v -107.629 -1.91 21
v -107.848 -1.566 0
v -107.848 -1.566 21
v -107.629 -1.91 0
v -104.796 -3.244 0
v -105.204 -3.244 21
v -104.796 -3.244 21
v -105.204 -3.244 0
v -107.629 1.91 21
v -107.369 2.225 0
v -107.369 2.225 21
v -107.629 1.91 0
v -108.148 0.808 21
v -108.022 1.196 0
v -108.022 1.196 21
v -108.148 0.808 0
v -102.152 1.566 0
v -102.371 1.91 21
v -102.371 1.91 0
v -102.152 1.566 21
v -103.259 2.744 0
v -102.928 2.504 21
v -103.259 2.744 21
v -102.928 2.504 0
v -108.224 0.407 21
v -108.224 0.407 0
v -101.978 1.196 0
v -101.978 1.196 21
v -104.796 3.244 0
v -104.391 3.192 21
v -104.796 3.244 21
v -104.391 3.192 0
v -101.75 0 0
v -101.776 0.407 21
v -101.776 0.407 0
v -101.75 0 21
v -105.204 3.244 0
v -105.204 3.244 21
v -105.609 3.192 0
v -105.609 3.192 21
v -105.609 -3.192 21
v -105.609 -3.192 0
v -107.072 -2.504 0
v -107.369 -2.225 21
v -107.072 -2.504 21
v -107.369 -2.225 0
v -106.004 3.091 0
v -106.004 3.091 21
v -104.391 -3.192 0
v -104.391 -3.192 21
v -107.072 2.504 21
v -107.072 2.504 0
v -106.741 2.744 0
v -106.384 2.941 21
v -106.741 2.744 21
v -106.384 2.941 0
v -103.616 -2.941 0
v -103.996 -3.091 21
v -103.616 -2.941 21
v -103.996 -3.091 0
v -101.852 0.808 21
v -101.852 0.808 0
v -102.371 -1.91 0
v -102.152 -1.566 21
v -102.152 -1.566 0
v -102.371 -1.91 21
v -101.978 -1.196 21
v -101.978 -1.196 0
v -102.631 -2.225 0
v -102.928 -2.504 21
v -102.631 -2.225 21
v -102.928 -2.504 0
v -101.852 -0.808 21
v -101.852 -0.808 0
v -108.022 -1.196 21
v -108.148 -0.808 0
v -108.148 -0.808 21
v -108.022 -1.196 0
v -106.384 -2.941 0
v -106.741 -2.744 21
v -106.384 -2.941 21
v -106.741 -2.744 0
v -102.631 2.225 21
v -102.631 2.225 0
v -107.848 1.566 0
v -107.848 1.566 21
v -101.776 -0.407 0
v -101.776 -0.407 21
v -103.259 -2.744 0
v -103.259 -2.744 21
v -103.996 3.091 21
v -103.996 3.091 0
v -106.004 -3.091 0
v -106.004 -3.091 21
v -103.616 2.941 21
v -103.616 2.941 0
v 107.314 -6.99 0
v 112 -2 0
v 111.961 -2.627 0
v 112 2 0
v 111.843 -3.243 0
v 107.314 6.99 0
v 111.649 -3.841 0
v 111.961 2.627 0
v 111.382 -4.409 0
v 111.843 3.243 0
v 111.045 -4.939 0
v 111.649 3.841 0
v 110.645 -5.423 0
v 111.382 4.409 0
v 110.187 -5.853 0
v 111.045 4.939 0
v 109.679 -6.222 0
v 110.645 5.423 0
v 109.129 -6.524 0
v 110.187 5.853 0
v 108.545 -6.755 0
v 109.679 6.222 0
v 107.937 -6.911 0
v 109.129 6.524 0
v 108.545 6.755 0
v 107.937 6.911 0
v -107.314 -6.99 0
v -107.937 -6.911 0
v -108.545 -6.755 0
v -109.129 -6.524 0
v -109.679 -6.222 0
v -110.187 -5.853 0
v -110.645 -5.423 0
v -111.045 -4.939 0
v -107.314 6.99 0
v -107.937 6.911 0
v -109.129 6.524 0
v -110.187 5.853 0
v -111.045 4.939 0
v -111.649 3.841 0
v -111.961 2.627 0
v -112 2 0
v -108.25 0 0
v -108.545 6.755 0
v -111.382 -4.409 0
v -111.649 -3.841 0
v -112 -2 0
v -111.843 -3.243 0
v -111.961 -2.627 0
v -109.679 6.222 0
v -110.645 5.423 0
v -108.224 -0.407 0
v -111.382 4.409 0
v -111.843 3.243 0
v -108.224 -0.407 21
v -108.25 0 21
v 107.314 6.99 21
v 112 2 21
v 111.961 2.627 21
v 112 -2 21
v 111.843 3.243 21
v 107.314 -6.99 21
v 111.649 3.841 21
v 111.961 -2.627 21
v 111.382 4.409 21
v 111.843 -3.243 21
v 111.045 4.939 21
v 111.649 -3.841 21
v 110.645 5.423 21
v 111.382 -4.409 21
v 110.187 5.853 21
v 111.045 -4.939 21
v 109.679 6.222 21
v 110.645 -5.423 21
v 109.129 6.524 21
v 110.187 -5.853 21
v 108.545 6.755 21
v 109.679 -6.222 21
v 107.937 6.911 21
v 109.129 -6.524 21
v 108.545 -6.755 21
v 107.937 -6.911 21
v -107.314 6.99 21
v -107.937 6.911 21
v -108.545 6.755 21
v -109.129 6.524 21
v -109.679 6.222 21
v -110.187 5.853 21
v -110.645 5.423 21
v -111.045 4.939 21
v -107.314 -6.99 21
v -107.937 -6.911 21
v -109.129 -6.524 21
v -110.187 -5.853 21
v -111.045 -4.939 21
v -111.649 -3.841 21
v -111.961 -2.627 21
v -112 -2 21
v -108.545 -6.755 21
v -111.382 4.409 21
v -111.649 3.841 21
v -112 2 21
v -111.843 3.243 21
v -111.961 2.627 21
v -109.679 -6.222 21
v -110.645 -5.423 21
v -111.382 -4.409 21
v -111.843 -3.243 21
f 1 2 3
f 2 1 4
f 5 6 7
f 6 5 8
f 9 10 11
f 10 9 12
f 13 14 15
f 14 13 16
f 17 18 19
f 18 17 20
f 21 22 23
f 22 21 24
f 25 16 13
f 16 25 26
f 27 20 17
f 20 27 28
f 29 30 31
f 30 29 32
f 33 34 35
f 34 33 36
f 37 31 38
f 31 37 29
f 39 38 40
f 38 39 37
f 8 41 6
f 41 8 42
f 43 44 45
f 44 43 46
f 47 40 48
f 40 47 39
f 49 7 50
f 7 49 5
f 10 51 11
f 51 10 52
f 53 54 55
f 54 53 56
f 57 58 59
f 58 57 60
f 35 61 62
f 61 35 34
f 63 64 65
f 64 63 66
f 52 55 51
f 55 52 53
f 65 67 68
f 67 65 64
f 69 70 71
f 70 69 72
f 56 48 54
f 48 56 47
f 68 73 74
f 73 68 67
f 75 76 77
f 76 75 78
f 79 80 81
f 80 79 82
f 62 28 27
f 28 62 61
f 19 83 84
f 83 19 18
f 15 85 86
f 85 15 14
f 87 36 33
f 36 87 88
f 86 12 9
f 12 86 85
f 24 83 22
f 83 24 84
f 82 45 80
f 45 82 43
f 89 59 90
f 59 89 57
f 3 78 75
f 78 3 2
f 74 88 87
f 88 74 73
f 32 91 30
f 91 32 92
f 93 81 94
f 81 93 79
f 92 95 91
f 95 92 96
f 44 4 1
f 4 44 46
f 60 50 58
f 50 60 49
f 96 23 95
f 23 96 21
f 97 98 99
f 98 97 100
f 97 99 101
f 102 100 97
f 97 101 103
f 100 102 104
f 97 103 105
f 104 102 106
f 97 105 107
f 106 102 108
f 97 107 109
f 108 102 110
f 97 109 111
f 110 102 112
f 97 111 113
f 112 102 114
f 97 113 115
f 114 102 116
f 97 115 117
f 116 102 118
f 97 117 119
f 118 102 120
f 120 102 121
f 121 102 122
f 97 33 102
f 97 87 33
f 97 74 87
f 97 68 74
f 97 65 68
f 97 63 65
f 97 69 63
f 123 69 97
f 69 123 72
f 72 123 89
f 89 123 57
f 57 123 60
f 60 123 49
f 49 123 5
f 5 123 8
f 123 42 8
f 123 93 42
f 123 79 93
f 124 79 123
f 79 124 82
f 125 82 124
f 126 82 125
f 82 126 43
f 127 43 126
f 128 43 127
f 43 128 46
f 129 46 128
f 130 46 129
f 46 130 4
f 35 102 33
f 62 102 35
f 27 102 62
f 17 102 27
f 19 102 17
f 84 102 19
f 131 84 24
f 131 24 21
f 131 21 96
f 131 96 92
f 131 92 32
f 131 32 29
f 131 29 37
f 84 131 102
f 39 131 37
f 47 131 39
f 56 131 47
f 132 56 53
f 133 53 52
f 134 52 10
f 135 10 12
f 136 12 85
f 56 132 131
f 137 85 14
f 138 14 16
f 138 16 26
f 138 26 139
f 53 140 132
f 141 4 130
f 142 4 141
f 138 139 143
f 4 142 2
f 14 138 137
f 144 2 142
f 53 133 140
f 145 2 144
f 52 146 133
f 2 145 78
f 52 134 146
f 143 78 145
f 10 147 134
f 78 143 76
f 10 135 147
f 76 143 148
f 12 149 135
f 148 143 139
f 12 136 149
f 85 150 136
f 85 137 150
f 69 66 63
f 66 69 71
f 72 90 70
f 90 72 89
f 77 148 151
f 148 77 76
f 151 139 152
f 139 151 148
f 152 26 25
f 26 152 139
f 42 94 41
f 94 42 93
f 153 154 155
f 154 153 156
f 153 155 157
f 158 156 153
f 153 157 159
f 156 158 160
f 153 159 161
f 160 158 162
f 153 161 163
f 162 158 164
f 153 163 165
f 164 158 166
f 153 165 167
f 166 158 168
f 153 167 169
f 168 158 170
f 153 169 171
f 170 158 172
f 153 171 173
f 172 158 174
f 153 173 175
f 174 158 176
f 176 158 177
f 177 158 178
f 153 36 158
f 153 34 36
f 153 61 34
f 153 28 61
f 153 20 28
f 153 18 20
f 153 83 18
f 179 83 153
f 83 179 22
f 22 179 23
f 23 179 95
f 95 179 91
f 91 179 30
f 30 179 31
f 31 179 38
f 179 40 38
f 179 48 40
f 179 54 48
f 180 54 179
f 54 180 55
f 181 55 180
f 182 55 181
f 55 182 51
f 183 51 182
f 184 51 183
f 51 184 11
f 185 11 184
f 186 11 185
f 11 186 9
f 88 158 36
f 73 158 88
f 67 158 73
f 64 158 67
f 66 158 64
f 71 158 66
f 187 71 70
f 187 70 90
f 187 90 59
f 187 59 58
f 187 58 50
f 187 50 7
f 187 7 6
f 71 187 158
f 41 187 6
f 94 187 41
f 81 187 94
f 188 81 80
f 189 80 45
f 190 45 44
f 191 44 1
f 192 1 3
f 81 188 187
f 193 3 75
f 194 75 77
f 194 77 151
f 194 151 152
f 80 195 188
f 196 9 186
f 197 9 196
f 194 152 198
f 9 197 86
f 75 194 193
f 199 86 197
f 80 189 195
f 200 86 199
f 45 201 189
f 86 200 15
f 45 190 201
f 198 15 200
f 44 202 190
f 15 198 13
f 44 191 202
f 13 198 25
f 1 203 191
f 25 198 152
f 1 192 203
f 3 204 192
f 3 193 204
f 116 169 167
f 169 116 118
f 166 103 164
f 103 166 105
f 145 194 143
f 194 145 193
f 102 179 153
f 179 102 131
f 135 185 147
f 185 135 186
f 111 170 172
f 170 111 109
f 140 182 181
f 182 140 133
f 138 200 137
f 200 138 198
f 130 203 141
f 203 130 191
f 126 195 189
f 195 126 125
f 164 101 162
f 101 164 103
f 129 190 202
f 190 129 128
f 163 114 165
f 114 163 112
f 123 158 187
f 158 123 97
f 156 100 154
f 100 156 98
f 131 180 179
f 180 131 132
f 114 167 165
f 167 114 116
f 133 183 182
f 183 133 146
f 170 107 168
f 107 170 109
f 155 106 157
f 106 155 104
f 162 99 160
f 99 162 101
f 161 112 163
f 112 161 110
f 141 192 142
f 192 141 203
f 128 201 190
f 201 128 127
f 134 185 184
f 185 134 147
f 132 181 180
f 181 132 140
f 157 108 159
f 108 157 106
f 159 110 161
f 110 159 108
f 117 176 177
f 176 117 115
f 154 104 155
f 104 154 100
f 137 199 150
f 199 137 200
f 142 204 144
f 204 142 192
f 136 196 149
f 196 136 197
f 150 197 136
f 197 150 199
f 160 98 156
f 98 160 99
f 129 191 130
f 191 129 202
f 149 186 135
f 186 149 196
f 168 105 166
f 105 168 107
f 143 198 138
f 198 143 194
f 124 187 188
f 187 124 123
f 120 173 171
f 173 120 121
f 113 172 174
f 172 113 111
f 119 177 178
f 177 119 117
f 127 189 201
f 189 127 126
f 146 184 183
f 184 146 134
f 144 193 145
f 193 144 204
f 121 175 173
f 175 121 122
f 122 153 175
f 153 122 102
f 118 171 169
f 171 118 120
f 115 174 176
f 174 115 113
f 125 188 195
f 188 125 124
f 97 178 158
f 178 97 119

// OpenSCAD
$fn = 50;


difference() {
	union() {
		hull() {
			translate(v = [-107.0000000000, 2.0000000000, 0]) {
				cylinder(h = 21, r = 5);
			}
			translate(v = [107.0000000000, 2.0000000000, 0]) {
				cylinder(h = 21, r = 5);
			}
			translate(v = [-107.0000000000, -2.0000000000, 0]) {
				cylinder(h = 21, r = 5);
			}
			translate(v = [107.0000000000, -2.0000000000, 0]) {
				cylinder(h = 21, r = 5);
			}
		}
	}
	union() {
		translate(v = [-105.0000000000, 0.0000000000, 0]) {
			cylinder(h = 21, r = 3.2500000000);
		}
		translate(v = [-105.0000000000, 0.0000000000, 0]) {
			cylinder(h = 21, r = 1.8000000000);
		}
		translate(v = [-105.0000000000, 0.0000000000, 0]) {
			cylinder(h = 21, r = 1.8000000000);
		}
		translate(v = [-105.0000000000, 0.0000000000, 0]) {
			cylinder(h = 21, r = 1.8000000000);
		}
	}
}
